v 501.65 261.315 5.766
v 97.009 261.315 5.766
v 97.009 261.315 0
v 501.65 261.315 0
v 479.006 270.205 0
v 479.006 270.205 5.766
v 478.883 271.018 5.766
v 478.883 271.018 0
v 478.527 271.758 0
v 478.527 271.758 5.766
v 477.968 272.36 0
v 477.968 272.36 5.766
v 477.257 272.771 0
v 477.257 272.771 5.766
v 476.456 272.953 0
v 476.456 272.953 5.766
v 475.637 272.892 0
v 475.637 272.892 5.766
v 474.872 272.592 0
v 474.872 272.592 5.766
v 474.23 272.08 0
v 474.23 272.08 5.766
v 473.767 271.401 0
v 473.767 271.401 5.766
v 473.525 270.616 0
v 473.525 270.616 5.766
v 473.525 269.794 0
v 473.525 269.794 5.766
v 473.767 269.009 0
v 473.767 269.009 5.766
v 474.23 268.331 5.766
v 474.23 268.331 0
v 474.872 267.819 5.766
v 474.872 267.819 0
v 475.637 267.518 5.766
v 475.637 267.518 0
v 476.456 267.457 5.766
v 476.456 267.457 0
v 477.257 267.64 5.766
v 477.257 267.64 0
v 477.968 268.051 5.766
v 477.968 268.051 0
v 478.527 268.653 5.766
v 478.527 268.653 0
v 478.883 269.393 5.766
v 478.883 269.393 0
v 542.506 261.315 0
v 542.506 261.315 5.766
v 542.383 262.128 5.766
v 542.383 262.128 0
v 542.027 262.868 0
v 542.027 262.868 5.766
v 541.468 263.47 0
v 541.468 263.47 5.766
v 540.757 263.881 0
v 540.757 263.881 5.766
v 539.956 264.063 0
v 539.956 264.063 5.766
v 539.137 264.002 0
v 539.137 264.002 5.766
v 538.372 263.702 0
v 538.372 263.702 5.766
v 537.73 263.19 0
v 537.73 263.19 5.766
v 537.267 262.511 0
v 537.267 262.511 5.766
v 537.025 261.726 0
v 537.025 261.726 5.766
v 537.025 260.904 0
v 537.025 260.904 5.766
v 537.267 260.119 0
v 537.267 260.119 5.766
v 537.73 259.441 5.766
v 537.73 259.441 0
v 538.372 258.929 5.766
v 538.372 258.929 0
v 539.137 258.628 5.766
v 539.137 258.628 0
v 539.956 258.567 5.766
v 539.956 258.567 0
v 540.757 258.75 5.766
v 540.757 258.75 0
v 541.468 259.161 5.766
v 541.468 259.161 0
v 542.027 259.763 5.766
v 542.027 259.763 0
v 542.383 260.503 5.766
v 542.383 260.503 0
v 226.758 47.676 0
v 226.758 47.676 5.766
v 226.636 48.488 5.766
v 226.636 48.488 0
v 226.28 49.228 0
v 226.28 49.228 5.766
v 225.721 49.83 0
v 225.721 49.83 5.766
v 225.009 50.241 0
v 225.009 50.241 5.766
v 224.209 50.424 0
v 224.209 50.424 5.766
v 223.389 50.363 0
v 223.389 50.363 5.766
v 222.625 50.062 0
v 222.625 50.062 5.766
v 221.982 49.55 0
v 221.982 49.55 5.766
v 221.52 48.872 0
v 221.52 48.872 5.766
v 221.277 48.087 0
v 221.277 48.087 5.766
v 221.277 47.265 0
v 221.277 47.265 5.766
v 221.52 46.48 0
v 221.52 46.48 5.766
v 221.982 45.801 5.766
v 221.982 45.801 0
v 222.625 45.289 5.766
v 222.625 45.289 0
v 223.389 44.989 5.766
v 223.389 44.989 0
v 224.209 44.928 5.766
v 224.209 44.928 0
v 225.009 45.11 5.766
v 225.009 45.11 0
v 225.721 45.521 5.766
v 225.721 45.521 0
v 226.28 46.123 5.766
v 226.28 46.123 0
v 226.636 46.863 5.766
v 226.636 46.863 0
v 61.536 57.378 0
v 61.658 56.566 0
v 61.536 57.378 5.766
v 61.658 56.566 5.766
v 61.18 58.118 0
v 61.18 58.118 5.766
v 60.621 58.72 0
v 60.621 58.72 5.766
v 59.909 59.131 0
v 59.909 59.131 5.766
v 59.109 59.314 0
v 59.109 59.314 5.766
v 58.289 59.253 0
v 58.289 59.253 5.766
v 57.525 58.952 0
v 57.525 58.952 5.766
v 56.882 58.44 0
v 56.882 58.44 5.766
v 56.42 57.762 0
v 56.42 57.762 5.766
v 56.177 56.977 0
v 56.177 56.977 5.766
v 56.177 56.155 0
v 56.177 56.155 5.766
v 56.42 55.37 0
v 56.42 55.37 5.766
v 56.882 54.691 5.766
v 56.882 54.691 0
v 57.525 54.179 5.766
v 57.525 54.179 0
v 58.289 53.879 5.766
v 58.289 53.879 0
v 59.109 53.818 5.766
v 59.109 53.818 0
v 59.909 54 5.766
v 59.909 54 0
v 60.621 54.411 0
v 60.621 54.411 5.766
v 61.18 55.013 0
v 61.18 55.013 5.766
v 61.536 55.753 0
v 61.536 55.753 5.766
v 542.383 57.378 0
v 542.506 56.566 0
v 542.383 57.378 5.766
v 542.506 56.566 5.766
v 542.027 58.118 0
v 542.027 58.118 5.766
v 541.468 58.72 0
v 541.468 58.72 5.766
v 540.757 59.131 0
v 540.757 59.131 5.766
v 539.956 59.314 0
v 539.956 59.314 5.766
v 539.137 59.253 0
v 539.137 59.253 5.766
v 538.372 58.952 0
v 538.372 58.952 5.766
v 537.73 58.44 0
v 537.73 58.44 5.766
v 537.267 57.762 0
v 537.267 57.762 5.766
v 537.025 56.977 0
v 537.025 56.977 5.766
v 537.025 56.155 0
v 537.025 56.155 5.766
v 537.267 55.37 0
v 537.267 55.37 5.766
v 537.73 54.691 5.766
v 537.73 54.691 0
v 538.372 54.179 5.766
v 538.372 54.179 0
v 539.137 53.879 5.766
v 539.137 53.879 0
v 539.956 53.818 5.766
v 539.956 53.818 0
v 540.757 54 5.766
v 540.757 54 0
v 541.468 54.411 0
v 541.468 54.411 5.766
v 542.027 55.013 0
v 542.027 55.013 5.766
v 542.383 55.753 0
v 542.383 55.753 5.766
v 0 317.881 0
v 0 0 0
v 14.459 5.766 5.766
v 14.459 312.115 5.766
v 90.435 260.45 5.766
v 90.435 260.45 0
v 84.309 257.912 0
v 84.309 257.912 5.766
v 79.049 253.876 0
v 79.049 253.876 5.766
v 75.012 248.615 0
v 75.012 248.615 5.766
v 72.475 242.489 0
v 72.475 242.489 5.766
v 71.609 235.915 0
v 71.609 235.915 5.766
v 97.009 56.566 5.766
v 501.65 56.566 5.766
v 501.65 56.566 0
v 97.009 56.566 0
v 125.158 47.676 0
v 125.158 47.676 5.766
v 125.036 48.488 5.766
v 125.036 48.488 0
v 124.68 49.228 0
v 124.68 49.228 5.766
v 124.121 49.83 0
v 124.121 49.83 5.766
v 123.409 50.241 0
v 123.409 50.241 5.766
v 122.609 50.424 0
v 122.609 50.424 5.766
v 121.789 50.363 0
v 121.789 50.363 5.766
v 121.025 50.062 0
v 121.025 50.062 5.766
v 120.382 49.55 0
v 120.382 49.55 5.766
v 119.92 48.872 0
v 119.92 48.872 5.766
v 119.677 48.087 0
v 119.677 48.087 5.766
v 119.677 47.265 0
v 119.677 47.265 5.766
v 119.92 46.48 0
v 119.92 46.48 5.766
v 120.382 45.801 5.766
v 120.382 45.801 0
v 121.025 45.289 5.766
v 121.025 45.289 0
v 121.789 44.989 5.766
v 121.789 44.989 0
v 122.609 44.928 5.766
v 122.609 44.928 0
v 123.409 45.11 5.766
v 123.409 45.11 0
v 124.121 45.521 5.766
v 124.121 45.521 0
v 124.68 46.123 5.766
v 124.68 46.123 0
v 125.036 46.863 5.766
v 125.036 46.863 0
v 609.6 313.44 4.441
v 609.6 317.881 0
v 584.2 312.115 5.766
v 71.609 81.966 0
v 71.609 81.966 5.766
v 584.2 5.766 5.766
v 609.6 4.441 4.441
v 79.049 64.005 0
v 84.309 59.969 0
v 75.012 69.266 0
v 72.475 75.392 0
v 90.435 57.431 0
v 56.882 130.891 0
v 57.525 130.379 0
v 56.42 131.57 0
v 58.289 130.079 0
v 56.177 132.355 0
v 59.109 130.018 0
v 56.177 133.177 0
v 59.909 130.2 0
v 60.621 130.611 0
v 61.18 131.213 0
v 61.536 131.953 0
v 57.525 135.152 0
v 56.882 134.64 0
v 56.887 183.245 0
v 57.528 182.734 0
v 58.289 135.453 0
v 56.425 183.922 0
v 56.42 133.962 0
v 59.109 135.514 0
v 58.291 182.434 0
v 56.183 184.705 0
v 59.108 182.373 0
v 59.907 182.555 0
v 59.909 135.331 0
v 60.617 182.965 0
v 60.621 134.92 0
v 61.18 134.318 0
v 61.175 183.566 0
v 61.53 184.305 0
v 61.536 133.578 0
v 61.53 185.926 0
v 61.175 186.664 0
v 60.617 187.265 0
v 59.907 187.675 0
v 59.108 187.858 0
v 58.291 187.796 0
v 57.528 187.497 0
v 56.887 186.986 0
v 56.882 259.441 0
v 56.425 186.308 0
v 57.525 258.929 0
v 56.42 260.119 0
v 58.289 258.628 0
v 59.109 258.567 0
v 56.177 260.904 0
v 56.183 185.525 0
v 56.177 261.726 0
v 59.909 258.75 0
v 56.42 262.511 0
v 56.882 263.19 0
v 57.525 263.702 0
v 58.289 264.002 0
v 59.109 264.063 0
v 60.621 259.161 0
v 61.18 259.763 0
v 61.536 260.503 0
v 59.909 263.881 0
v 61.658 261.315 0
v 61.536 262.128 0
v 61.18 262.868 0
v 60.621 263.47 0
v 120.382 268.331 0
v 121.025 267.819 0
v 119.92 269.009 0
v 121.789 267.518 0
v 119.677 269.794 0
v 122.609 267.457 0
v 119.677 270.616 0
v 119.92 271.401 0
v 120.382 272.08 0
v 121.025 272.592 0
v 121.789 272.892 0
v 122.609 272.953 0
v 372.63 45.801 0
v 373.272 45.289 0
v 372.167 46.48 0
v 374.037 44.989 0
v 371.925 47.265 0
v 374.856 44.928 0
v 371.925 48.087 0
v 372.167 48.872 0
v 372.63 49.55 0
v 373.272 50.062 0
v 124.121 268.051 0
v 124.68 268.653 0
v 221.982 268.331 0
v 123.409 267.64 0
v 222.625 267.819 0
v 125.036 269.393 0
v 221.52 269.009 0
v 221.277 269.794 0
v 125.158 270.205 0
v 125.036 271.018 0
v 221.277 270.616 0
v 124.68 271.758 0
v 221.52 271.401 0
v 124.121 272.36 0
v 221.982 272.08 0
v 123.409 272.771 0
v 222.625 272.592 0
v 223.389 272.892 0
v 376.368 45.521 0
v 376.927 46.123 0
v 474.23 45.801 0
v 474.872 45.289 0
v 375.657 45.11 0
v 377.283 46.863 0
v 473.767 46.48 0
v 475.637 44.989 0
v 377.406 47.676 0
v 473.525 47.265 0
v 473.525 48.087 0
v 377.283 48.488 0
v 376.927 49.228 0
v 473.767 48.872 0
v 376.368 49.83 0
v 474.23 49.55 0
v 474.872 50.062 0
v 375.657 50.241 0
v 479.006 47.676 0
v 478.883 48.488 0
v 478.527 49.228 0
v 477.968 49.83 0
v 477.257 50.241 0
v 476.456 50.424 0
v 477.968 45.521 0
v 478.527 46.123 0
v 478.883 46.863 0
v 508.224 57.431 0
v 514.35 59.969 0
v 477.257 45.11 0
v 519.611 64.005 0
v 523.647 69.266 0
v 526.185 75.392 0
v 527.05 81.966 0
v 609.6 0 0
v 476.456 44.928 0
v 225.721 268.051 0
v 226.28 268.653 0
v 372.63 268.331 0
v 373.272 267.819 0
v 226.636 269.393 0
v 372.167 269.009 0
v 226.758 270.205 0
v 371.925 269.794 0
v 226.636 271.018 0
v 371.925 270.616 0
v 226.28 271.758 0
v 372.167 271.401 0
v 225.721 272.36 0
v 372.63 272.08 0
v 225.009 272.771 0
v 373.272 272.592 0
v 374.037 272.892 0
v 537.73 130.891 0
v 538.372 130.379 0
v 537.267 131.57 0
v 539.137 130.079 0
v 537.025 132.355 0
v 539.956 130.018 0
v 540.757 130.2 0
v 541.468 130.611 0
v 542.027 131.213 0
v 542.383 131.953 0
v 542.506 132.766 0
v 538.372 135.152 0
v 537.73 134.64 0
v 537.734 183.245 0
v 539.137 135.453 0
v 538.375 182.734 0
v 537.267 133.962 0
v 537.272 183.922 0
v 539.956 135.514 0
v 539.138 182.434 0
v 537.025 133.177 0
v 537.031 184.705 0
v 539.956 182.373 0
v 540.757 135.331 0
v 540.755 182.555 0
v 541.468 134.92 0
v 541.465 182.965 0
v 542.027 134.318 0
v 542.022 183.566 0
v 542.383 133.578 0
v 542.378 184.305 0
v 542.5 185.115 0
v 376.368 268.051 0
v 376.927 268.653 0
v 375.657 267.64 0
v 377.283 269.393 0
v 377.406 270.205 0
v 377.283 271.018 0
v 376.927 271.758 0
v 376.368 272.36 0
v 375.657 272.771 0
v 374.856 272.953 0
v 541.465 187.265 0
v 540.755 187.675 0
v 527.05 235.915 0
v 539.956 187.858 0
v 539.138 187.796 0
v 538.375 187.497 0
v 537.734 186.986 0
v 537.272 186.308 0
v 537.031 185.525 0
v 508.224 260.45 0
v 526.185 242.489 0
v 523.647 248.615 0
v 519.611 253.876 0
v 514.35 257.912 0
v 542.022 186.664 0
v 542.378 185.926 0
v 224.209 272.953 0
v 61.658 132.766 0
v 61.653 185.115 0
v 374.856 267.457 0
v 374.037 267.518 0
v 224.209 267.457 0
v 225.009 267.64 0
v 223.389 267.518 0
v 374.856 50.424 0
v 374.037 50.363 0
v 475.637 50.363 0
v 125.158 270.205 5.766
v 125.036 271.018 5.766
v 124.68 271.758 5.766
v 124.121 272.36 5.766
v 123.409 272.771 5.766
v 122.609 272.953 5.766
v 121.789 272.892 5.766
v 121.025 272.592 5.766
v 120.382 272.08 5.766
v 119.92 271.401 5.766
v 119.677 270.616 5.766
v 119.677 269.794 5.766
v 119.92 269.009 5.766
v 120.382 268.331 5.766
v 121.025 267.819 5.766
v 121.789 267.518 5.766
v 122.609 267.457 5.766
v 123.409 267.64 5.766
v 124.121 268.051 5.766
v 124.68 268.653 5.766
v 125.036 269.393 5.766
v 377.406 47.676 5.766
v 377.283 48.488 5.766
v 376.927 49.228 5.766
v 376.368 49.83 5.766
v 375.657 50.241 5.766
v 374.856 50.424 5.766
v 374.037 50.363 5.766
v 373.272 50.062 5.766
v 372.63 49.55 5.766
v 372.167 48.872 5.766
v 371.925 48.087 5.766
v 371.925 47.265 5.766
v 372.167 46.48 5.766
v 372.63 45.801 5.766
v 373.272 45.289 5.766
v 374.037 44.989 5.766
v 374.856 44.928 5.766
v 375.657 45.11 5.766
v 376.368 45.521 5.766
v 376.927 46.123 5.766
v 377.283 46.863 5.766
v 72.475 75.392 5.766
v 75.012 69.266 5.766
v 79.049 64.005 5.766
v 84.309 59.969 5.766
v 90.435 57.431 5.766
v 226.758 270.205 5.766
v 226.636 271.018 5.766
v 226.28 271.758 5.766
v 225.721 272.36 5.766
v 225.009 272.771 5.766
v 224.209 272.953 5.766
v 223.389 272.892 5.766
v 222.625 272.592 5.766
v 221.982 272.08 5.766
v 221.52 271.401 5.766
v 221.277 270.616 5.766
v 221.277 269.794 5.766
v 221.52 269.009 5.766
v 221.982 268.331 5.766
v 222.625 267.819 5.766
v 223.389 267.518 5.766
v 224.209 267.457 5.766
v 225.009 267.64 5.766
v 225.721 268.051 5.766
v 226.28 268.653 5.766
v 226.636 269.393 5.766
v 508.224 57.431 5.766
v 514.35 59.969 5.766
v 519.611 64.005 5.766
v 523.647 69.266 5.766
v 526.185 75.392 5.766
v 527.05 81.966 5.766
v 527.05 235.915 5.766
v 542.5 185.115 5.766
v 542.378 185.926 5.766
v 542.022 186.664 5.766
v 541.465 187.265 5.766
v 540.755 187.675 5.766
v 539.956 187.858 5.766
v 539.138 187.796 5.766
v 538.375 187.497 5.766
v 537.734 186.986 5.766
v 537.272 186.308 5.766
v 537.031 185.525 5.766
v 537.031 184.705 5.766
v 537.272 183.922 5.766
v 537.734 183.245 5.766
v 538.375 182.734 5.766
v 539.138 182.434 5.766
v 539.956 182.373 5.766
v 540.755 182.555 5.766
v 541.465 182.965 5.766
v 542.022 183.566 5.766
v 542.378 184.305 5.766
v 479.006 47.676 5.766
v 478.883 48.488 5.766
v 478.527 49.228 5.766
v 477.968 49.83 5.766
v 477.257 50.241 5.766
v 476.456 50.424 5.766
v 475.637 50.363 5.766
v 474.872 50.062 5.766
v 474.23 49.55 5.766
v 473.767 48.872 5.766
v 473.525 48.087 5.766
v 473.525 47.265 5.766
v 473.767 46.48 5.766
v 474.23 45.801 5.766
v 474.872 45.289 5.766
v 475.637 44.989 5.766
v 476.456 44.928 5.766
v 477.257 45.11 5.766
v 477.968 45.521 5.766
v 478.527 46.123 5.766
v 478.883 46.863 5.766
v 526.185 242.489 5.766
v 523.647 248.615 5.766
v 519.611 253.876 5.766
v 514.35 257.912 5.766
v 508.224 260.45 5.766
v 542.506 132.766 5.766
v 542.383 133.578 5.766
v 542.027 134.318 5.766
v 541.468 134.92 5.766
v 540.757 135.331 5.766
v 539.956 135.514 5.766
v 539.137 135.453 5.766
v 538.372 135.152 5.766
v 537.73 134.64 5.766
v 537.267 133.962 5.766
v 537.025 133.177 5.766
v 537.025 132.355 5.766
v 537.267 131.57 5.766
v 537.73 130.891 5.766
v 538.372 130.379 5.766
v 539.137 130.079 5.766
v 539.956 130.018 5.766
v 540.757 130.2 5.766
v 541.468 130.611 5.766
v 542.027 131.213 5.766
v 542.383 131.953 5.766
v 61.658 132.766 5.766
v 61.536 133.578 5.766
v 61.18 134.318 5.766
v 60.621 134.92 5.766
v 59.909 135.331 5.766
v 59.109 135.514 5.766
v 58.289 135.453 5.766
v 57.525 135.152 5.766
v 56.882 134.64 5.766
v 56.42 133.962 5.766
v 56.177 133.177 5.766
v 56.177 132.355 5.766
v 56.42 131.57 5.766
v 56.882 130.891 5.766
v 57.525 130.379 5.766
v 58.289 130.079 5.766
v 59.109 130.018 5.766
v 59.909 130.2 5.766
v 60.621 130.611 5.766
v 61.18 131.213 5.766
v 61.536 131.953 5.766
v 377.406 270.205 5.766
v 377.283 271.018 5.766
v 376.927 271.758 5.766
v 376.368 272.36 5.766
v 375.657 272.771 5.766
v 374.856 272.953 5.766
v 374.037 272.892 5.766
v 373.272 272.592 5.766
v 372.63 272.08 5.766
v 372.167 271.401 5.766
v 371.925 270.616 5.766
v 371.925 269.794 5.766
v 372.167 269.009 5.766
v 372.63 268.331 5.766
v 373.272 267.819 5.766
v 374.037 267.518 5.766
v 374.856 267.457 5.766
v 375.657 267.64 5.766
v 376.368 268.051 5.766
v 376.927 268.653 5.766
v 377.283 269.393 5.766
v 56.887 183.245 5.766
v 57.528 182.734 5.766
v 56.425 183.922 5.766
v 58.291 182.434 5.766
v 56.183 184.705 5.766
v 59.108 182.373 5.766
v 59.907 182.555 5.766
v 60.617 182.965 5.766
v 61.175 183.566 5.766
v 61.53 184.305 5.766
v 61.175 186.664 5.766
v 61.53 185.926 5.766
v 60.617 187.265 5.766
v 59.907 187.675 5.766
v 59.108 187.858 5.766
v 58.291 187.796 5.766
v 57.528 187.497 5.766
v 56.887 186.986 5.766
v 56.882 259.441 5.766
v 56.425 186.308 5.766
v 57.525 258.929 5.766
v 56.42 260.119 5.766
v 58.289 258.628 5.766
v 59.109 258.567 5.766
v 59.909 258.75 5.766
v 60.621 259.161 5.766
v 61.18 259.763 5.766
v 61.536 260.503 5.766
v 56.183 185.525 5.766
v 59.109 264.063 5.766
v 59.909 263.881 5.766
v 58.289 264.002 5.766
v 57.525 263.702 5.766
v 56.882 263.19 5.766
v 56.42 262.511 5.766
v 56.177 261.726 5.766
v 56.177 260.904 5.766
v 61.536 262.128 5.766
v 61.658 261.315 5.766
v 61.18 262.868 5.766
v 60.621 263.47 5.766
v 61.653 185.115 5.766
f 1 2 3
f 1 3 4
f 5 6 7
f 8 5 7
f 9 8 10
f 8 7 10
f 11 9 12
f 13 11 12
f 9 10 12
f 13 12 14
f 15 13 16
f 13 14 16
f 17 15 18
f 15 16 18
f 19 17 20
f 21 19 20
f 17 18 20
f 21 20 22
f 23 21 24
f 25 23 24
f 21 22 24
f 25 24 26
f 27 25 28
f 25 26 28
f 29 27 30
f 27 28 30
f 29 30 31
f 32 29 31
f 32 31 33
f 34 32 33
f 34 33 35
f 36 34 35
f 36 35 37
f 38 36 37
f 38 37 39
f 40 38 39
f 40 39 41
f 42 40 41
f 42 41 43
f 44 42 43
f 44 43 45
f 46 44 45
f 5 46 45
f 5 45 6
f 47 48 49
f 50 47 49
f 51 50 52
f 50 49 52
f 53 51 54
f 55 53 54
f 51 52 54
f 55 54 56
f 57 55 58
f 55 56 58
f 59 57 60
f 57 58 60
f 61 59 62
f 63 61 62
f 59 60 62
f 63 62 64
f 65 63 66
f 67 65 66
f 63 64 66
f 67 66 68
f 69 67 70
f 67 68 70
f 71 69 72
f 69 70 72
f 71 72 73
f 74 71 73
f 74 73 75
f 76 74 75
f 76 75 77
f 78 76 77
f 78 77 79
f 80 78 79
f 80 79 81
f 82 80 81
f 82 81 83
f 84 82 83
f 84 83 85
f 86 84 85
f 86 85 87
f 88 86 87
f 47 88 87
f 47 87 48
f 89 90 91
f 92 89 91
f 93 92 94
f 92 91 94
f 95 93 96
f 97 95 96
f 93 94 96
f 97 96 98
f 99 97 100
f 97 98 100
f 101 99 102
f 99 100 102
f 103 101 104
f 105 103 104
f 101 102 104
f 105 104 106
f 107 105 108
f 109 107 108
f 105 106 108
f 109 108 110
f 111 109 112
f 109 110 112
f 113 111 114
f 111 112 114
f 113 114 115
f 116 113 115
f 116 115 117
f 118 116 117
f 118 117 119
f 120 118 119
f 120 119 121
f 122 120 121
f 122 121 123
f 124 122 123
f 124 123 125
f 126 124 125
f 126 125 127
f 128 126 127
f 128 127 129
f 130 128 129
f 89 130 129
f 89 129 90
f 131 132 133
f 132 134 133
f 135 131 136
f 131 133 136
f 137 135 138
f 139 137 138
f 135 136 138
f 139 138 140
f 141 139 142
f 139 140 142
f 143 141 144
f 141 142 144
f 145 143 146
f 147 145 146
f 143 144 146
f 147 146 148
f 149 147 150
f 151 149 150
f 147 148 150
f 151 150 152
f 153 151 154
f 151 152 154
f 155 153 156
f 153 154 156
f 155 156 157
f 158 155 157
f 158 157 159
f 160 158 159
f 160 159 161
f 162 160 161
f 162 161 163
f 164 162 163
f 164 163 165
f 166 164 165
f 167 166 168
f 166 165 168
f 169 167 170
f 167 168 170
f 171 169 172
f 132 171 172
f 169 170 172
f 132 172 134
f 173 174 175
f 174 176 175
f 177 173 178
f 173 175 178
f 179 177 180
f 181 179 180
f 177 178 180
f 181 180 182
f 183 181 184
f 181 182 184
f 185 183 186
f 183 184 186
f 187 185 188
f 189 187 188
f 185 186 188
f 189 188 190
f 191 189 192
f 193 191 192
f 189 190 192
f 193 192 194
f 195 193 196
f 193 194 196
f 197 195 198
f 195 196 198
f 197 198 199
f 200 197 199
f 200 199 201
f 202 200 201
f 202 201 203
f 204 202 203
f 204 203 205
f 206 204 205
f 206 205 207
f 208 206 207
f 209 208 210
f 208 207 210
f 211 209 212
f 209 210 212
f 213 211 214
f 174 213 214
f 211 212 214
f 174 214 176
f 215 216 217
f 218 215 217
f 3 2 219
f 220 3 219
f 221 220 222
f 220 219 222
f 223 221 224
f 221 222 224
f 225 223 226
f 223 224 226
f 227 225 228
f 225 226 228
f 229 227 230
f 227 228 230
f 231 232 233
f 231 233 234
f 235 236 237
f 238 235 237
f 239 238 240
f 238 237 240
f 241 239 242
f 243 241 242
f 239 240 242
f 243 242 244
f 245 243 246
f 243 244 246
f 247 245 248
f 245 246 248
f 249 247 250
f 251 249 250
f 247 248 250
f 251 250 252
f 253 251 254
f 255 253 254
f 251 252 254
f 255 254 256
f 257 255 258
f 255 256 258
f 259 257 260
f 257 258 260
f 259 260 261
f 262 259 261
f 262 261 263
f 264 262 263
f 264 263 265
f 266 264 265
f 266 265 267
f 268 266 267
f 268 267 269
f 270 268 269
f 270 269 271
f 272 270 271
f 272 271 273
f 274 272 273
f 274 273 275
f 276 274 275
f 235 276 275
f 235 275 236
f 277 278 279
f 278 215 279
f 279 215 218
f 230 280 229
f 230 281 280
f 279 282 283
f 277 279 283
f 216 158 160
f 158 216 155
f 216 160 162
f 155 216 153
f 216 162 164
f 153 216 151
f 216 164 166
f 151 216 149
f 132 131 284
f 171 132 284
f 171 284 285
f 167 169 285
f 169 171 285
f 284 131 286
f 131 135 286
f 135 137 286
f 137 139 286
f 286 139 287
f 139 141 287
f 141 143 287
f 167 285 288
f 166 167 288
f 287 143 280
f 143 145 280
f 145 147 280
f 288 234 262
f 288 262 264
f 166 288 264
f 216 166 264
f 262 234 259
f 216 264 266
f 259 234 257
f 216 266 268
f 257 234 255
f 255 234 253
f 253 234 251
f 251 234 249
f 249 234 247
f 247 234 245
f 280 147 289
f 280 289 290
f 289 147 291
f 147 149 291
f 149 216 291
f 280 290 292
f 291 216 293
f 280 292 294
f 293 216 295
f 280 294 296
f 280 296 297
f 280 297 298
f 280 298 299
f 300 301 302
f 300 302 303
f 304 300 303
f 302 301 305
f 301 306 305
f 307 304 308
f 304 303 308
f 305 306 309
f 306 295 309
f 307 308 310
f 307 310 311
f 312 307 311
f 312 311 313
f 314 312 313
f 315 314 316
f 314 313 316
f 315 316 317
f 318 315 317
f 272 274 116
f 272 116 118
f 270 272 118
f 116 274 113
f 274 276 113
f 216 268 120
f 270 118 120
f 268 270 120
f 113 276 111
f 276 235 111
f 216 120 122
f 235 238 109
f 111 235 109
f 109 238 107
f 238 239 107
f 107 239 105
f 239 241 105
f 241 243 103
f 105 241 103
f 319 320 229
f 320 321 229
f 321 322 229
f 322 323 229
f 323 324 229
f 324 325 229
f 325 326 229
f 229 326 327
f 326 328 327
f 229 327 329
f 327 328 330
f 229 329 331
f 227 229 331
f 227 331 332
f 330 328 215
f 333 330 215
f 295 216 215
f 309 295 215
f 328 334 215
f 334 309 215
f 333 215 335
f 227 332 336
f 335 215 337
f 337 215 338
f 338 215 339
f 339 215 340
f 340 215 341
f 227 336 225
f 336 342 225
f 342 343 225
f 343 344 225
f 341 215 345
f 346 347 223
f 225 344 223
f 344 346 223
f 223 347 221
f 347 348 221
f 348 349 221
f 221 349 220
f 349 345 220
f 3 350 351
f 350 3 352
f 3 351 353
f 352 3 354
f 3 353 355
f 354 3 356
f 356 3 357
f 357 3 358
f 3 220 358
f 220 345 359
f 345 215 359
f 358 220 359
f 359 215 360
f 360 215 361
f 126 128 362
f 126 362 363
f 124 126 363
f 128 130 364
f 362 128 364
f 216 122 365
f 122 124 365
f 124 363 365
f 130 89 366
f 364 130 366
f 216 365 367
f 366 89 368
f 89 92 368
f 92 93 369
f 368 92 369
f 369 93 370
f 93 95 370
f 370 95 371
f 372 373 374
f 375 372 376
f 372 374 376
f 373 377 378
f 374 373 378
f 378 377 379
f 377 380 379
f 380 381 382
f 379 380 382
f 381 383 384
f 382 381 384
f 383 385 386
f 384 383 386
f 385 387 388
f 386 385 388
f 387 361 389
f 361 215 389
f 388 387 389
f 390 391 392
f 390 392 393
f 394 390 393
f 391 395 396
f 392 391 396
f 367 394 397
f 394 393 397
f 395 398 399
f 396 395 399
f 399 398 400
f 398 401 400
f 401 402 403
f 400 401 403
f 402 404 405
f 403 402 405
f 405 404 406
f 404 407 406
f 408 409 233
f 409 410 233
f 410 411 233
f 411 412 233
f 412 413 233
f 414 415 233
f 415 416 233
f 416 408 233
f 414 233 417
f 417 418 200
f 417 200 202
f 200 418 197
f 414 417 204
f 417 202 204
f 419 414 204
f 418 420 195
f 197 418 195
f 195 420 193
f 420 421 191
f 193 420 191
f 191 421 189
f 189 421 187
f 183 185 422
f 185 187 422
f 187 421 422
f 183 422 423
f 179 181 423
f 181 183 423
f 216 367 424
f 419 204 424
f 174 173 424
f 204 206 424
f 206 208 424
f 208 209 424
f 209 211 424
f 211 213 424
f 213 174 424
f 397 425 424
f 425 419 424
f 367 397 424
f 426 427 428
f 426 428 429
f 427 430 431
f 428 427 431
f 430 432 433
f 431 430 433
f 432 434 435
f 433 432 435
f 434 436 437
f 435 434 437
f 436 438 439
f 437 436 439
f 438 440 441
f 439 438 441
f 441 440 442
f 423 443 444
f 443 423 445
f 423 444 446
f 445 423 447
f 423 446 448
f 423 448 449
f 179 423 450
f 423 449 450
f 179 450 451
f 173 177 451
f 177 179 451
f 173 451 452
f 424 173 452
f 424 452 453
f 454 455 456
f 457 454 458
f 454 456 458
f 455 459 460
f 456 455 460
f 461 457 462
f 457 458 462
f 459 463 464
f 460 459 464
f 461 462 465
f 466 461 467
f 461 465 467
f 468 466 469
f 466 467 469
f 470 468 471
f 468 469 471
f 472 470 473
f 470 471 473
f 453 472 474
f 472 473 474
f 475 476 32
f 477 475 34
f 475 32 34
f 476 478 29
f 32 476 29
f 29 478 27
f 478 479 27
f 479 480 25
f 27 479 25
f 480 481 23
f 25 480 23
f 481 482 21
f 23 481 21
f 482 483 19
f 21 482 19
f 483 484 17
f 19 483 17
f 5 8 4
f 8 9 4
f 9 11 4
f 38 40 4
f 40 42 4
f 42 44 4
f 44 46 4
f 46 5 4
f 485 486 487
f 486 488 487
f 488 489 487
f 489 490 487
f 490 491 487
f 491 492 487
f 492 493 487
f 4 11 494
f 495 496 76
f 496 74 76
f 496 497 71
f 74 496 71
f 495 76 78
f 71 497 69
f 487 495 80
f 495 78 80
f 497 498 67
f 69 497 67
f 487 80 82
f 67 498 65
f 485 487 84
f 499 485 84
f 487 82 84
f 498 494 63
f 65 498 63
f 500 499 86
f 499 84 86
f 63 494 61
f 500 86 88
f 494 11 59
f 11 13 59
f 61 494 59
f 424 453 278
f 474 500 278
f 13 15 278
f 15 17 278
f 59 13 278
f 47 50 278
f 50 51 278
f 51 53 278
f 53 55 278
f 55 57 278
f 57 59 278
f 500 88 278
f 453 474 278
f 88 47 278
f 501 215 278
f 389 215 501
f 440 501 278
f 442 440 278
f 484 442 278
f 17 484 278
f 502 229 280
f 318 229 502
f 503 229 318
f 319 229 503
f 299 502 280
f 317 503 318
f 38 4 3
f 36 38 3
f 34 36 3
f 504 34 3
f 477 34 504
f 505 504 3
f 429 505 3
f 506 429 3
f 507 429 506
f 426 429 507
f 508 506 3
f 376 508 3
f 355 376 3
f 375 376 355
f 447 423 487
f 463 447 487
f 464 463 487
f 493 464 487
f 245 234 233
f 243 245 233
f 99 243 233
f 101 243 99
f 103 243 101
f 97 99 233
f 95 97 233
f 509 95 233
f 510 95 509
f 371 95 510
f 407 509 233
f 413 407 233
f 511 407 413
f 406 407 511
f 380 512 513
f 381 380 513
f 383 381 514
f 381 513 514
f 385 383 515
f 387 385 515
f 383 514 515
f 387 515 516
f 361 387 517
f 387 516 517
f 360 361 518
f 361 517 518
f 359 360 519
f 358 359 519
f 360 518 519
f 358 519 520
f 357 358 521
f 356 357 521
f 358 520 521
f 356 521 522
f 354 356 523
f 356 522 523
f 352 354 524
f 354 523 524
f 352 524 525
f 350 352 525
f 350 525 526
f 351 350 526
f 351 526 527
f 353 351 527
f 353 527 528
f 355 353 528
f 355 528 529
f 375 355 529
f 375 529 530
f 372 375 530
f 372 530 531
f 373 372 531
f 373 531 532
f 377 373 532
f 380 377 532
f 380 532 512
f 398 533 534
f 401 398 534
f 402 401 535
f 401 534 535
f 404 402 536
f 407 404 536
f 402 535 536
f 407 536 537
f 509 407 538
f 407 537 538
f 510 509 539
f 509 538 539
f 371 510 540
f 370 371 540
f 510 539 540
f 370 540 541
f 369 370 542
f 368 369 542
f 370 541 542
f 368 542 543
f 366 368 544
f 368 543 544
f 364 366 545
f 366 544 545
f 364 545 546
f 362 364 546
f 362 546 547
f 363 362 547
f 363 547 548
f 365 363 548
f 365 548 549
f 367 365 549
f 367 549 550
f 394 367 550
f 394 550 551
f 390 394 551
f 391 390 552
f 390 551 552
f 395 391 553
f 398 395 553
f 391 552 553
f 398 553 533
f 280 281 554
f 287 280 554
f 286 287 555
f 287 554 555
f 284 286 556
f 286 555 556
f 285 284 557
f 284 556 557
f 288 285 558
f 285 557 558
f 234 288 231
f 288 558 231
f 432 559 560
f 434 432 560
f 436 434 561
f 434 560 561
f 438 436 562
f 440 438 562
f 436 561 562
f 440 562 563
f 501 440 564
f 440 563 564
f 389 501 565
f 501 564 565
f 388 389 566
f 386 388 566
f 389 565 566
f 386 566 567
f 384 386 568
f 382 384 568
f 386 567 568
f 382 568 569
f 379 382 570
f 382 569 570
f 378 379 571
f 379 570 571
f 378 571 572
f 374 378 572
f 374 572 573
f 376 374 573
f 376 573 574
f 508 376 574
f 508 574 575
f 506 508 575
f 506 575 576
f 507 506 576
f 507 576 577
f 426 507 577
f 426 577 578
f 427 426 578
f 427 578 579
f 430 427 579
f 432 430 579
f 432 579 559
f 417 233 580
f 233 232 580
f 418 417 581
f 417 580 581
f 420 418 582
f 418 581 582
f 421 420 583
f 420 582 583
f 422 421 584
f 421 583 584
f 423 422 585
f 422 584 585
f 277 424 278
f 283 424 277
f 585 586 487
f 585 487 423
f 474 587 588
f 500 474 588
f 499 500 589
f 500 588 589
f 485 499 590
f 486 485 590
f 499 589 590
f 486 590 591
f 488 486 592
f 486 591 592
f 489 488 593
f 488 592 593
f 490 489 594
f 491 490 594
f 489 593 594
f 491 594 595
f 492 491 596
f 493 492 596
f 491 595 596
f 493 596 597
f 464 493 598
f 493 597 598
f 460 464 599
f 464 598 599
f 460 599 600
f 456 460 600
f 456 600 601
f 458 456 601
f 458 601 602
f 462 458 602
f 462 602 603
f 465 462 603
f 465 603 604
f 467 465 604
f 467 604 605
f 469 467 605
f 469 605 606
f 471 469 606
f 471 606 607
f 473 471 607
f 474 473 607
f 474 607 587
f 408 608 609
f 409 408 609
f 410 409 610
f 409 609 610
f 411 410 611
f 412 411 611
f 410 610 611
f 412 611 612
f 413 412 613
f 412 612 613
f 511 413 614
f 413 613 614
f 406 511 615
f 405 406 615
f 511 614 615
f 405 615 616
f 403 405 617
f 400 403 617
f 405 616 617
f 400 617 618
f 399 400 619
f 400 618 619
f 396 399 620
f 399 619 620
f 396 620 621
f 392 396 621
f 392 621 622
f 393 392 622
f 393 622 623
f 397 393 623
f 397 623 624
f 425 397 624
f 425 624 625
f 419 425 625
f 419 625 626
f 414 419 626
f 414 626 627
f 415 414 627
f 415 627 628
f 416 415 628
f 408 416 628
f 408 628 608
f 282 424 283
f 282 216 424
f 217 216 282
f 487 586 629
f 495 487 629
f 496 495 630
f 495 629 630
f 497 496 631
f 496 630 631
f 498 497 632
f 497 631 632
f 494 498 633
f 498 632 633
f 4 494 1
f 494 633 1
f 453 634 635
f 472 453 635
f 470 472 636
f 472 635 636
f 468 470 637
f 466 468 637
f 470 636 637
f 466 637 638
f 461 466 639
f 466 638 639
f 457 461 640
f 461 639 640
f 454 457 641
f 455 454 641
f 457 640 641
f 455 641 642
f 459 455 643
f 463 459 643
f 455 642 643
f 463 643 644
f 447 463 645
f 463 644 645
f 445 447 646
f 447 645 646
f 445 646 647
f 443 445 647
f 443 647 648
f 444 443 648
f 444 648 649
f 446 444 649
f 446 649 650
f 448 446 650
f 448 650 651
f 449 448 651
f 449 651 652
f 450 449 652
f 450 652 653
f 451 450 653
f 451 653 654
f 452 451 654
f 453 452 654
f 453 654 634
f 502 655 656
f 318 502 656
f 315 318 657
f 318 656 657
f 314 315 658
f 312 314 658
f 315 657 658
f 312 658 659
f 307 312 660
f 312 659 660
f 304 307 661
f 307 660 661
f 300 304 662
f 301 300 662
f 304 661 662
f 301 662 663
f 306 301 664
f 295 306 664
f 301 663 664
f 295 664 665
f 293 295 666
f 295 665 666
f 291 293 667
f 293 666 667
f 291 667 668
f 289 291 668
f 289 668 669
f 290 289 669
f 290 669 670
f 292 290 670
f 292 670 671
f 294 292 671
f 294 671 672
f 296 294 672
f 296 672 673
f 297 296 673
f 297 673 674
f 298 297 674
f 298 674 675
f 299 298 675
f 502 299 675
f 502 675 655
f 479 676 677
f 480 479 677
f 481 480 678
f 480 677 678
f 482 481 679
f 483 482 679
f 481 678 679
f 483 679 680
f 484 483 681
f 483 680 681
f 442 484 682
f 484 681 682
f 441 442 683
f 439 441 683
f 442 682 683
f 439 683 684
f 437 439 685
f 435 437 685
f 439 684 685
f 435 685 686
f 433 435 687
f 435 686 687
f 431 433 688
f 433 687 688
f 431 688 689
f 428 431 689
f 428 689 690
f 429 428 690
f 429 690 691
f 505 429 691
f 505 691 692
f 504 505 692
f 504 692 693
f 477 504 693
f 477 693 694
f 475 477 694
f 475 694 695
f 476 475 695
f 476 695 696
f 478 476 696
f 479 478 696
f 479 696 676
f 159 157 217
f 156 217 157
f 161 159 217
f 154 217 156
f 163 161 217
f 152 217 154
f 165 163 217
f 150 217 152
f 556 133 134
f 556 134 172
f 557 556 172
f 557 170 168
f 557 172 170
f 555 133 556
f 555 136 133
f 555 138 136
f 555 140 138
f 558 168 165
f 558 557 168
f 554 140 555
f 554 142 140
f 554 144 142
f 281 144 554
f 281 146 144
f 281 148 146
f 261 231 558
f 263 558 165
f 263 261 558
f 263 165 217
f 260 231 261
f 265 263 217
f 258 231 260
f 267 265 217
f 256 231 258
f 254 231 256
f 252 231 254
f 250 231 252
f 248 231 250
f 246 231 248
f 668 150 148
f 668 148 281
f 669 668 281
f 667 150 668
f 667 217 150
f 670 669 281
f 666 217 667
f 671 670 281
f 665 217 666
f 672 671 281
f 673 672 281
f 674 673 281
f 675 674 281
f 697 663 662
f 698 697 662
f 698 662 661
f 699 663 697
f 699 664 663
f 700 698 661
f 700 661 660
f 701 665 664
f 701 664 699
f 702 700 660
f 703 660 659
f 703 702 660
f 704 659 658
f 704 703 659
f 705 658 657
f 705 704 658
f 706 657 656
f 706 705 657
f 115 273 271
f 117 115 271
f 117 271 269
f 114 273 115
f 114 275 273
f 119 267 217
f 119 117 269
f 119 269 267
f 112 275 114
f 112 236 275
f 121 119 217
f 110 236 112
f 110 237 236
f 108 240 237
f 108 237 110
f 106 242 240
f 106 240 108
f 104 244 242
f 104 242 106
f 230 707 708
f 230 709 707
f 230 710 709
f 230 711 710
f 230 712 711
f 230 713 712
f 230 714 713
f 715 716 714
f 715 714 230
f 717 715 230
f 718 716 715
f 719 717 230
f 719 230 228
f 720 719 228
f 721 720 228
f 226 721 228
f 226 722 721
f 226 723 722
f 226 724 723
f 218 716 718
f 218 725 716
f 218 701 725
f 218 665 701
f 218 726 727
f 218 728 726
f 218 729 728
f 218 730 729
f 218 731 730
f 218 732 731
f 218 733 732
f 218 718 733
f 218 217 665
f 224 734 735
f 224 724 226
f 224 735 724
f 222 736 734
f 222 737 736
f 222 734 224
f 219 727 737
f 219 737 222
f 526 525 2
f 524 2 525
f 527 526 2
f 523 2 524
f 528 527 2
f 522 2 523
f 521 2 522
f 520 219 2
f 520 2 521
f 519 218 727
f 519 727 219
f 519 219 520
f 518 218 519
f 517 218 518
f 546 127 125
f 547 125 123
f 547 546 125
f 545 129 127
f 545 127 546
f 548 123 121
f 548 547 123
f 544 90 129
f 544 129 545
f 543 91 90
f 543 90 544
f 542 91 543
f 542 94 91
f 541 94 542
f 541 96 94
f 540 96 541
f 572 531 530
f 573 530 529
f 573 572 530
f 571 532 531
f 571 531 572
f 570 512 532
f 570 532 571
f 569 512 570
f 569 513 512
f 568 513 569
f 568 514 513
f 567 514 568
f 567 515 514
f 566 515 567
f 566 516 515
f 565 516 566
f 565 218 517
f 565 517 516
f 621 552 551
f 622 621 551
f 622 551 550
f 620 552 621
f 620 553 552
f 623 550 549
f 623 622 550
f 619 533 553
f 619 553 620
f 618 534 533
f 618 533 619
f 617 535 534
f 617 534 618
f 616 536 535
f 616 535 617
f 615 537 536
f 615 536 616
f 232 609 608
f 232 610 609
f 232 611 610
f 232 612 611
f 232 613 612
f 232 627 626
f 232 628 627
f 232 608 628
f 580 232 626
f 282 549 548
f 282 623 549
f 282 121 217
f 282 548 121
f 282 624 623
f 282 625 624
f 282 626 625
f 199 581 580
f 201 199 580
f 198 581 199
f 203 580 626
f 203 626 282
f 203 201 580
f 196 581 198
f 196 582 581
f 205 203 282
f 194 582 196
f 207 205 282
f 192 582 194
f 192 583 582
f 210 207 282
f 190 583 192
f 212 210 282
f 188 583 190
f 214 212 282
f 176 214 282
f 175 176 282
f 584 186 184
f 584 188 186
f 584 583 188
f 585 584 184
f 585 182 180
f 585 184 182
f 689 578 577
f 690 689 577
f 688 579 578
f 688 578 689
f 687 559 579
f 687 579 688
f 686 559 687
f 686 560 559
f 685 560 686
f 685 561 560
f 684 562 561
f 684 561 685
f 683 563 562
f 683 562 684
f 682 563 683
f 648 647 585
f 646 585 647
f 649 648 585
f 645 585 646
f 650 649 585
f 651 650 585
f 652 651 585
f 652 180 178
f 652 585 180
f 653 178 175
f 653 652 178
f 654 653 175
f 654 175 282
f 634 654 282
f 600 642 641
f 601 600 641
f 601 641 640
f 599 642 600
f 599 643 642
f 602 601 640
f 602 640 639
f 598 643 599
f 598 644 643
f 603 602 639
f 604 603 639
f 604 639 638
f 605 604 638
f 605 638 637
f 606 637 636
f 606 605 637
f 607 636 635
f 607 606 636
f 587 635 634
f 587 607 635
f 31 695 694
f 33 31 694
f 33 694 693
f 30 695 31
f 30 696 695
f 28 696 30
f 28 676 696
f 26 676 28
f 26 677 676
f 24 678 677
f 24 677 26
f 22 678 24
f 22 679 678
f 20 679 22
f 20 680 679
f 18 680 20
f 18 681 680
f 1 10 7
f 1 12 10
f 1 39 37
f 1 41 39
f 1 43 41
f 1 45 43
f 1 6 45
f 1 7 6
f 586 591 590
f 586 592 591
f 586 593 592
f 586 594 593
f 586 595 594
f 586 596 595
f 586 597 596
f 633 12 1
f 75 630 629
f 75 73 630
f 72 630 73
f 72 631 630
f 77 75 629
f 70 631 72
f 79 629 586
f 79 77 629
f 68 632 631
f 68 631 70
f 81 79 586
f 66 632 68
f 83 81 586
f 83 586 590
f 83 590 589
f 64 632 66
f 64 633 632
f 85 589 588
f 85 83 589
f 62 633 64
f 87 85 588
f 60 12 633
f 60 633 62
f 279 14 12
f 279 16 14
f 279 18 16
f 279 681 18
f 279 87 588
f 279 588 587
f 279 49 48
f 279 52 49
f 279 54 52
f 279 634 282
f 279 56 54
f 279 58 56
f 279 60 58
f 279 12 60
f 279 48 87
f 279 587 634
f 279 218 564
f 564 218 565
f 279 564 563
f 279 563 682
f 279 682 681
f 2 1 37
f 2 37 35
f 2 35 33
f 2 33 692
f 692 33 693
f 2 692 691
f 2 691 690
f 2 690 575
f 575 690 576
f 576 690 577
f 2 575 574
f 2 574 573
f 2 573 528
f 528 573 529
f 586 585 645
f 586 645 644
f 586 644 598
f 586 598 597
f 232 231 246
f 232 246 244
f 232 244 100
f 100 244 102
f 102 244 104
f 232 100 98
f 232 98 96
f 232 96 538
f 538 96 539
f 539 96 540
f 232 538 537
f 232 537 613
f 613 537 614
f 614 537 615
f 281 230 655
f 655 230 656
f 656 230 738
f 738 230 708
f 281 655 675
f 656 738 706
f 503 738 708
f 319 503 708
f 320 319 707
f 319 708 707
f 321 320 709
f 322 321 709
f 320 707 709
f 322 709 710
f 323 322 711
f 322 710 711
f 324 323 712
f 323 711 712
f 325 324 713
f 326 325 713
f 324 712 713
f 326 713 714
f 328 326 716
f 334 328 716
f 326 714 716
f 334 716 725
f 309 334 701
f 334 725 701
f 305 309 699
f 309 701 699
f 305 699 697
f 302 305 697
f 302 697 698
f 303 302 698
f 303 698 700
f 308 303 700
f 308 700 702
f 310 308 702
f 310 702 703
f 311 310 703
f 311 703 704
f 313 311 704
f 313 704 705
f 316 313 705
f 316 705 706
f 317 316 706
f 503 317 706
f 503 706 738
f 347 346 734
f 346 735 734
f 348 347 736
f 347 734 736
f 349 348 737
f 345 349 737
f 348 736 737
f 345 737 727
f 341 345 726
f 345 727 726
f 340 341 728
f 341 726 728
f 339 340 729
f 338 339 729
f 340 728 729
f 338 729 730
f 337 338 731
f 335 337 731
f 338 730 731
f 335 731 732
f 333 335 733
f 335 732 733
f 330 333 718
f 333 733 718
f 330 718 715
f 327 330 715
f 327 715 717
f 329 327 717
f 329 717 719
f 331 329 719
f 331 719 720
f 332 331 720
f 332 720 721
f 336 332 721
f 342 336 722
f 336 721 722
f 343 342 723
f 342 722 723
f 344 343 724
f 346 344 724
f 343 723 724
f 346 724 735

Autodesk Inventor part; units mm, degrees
ref_plane "YZ Plane" through (0, 0, 0) normal (1, 0, 0) x (0, 1, 0)
ref_plane "XY Plane" through (0, 0, 0) normal (0, 0, 1) x (1, 0, 0)
sketch "Sketch1" plane through (0, 0, 0) normal (0, 0, 1) x (1, 0, 0)
  line L0 (0, 0) -> (609.6, 0)
  line L1 (609.6, 0) -> (609.6, 317.881)
  line L2 (609.6, 317.881) -> (0, 317.881)
  line L3 (0, 317.881) -> (0, 0)
  dimension "d0" = 609.6
  dimension "d1" = 317.881
extrude "Extrusion1" add sketch "Sketch1" along normal blind 5.7658
sketch "Sketch2" plane through (0, 317.881, 0) normal (0, 1, 0) x (1, 0, 0)
  line L0 (609.6, 0) -> (0, 0) projected
  line L1 (0, 0) -> (0, -5.7658) projected
  line L2 (609.6, -5.7658) -> (0, -5.7658) projected
  line L3 (609.6, 0) -> (609.6, -5.7658) projected
  line L4 (0, 0) -> (609.6, 0) projected
  line L5 (0, 0) -> (14.4594, -5.7658)
  line L6 (0, -5.7658) -> (609.6, -5.7658) projected
  line L7 (14.4594, -5.7658) -> (14.4594, 0)
  line L8 (14.4594, -5.7658) -> (20.2252, -5.7658) construction
  dimension "d4" = 21.74
  dimension "d5" = 90
extrude "Extrusion2" cut sketch "Sketch2" against normal through all contours L5 L2 L1
sketch "Sketch3" plane through (609.6, 0, 0) normal (1, 0, 0) x (0, 0, -1)
  line L0 (0, 0) -> (0, 317.881) projected
  line L1 (0, 317.881) -> (-5.7658, 317.881) projected
  line L2 (-5.7658, 0) -> (-5.7658, 317.881) projected
  line L3 (0, 0) -> (-5.7658, 0) projected
  line L4 (0, 0) -> (-5.7658, 0) projected
  line L5 (0, 0) -> (-5.7658, 5.7658)
  line L6 (-5.7658, 0) -> (-5.7658, 317.881) projected
  line L7 (0, 0) -> (8.1541, 0) construction
  line L8 (0, 317.881) -> (-5.7658, 317.881) projected
  line L9 (0, 317.881) -> (-5.7658, 312.1152)
  line L10 (0, 317.881) -> (8.1541, 317.881) construction
  dimension "d8" = 135
  dimension "d9" = 135
extrude "Extrusion3" cut sketch "Sketch3" against normal through all contours L3 L2 L5 | L9 L2 L1
ref_plane "Center Plane" through (0, 158.9405, 0) normal (0, 1, 0) x (-1, 0, 0)
sketch "Sketch4" plane through (0, 158.9405, 0) normal (0, 1, 0) x (-1, 0, 0)
  line L0 (-14.4594, 5.7658) -> (0, 0) projected
  line L1 (-609.6, 5.7658) -> (-14.4594, 5.7658) projected
  line L2 (-609.6, 0) -> (-609.6, 5.7658) projected
  line L3 (-609.6, 0) -> (0, 0) projected
  line L4 (-609.6, 5.7658) -> (-584.2, 5.7658) construction
  line L5 (-609.6, 5.7658) -> (-14.4594, 5.7658) construction
  line L6 (-584.2, 5.7658) -> (-609.6, 4.4413)
  point P0 (0, 0)
  dimension "d13" = 25.4
  dimension "d14" = 2.985
extrude "Extrusion4" cut sketch "Sketch4" against normal through all both and the other way through all contours L6 L2 L1
sketch "Sketch5" plane through (0, 0, 5.7658) normal (0, 0, 1) x (1, 0, 0)
  line L0 (97.0094, 261.3152) -> (501.65, 261.3152)
  line L1 (527.05, 235.9152) -> (527.05, 81.9658)
  line L2 (501.65, 56.5658) -> (97.0094, 56.5658)
  line L3 (71.6094, 81.9658) -> (71.6094, 235.9152)
  line L4 (584.2, 312.1152) -> (14.4594, 312.1152) projected
  line L5 (14.4594, 5.7658) -> (584.2, 5.7658) projected
  line L6 (584.2, 5.7658) -> (584.2, 312.1152) projected
  line L7 (14.4594, 312.1152) -> (14.4594, 5.7658) projected
  arc A0 (97.0094, 261.3152) -> (71.6094, 235.9152) centre (97.0094, 235.9152) ccw
  arc A1 (527.05, 235.9152) -> (501.65, 261.3152) centre (501.65, 235.9152) ccw
  arc A2 (501.65, 56.5658) -> (527.05, 81.9658) centre (501.65, 81.9658) ccw
  arc A3 (71.6094, 81.9658) -> (97.0094, 56.5658) centre (97.0094, 81.9658) ccw
  point P0 (0, 0)
  dimension "d18" = 50.8
  dimension "d19" = 50.8
  dimension "d20" = 57.15
  dimension "d21" = 57.15
  dimension "d22" = 25.4
extrude "Extrusion5" cut sketch "Sketch5" against normal through all contours L0 A1 L1 A2 L2 A3 L3 A0
sketch "Sketch6" plane through (0, 0, 5.7658) normal (0, 0, 1) x (1, 0, 0)
  circle A0 centre (539.75, 56.5658) radius 2.7559
  circle A1 centre (539.75, 132.7658) radius 2.7559
  circle A2 centre (539.75, 185.1152) radius 2.75
  circle A3 centre (539.75, 261.3152) radius 2.7559
  line L0 (527.05, 235.9152) -> (527.05, 81.9658) projected
  line L1 (501.65, 56.5658) -> (97.0094, 56.5658) projected
  circle A4 centre (58.9026, 56.5658) radius 2.7559
  circle A5 centre (58.9026, 132.7658) radius 2.7559
  circle A6 centre (58.9026, 185.1152) radius 2.75
  circle A7 centre (58.9026, 261.3152) radius 2.7559
  circle A8 centre (476.25, 47.6758) radius 2.7559
  circle A9 centre (374.65, 47.6758) radius 2.7559
  circle A10 centre (224.0026, 47.6758) radius 2.7559
  circle A11 centre (122.4026, 47.6758) radius 2.7559
  circle A12 centre (476.25, 270.2052) radius 2.7559
  circle A13 centre (374.65, 270.2052) radius 2.7559
  circle A14 centre (224.0026, 270.2052) radius 2.7559
  circle A15 centre (122.4026, 270.2052) radius 2.7559
  point P0 (0, 0)
  dimension "d25" = 5.5118
  dimension "d26" = 5.5118
  dimension "d27" = 5.5
  dimension "d28" = 5.5118
  dimension "d29" = 12.7
  dimension "d30" = 25.4
  dimension "d31" = 76.2
  dimension "d32" = 52.3494
  dimension "d33" = 76.2
  dimension "d34" = 12.7
  dimension "d35" = 12.7
  dimension "d36" = 12.7
  dimension "d39" = 480.8474
  dimension "d44" = 5.5118
  dimension "d45" = 5.5118
  dimension "d46" = 5.5118
  dimension "d48" = 63.5
  dimension "d49" = 8.89
  dimension "d50" = 8.89
  dimension "d51" = 8.89
  dimension "d53" = 101.6
  dimension "d54" = 150.6474
  dimension "d55" = 5.5118
  dimension "d56" = 101.6
  dimension "d57" = 8.89
  dimension "d63" = 222.5294
extrude "Extrusion6" cut sketch "Sketch6" against normal through all
properties part number "Wind Tunnel Test Section Front" material "Polycarbonate, Clear"
